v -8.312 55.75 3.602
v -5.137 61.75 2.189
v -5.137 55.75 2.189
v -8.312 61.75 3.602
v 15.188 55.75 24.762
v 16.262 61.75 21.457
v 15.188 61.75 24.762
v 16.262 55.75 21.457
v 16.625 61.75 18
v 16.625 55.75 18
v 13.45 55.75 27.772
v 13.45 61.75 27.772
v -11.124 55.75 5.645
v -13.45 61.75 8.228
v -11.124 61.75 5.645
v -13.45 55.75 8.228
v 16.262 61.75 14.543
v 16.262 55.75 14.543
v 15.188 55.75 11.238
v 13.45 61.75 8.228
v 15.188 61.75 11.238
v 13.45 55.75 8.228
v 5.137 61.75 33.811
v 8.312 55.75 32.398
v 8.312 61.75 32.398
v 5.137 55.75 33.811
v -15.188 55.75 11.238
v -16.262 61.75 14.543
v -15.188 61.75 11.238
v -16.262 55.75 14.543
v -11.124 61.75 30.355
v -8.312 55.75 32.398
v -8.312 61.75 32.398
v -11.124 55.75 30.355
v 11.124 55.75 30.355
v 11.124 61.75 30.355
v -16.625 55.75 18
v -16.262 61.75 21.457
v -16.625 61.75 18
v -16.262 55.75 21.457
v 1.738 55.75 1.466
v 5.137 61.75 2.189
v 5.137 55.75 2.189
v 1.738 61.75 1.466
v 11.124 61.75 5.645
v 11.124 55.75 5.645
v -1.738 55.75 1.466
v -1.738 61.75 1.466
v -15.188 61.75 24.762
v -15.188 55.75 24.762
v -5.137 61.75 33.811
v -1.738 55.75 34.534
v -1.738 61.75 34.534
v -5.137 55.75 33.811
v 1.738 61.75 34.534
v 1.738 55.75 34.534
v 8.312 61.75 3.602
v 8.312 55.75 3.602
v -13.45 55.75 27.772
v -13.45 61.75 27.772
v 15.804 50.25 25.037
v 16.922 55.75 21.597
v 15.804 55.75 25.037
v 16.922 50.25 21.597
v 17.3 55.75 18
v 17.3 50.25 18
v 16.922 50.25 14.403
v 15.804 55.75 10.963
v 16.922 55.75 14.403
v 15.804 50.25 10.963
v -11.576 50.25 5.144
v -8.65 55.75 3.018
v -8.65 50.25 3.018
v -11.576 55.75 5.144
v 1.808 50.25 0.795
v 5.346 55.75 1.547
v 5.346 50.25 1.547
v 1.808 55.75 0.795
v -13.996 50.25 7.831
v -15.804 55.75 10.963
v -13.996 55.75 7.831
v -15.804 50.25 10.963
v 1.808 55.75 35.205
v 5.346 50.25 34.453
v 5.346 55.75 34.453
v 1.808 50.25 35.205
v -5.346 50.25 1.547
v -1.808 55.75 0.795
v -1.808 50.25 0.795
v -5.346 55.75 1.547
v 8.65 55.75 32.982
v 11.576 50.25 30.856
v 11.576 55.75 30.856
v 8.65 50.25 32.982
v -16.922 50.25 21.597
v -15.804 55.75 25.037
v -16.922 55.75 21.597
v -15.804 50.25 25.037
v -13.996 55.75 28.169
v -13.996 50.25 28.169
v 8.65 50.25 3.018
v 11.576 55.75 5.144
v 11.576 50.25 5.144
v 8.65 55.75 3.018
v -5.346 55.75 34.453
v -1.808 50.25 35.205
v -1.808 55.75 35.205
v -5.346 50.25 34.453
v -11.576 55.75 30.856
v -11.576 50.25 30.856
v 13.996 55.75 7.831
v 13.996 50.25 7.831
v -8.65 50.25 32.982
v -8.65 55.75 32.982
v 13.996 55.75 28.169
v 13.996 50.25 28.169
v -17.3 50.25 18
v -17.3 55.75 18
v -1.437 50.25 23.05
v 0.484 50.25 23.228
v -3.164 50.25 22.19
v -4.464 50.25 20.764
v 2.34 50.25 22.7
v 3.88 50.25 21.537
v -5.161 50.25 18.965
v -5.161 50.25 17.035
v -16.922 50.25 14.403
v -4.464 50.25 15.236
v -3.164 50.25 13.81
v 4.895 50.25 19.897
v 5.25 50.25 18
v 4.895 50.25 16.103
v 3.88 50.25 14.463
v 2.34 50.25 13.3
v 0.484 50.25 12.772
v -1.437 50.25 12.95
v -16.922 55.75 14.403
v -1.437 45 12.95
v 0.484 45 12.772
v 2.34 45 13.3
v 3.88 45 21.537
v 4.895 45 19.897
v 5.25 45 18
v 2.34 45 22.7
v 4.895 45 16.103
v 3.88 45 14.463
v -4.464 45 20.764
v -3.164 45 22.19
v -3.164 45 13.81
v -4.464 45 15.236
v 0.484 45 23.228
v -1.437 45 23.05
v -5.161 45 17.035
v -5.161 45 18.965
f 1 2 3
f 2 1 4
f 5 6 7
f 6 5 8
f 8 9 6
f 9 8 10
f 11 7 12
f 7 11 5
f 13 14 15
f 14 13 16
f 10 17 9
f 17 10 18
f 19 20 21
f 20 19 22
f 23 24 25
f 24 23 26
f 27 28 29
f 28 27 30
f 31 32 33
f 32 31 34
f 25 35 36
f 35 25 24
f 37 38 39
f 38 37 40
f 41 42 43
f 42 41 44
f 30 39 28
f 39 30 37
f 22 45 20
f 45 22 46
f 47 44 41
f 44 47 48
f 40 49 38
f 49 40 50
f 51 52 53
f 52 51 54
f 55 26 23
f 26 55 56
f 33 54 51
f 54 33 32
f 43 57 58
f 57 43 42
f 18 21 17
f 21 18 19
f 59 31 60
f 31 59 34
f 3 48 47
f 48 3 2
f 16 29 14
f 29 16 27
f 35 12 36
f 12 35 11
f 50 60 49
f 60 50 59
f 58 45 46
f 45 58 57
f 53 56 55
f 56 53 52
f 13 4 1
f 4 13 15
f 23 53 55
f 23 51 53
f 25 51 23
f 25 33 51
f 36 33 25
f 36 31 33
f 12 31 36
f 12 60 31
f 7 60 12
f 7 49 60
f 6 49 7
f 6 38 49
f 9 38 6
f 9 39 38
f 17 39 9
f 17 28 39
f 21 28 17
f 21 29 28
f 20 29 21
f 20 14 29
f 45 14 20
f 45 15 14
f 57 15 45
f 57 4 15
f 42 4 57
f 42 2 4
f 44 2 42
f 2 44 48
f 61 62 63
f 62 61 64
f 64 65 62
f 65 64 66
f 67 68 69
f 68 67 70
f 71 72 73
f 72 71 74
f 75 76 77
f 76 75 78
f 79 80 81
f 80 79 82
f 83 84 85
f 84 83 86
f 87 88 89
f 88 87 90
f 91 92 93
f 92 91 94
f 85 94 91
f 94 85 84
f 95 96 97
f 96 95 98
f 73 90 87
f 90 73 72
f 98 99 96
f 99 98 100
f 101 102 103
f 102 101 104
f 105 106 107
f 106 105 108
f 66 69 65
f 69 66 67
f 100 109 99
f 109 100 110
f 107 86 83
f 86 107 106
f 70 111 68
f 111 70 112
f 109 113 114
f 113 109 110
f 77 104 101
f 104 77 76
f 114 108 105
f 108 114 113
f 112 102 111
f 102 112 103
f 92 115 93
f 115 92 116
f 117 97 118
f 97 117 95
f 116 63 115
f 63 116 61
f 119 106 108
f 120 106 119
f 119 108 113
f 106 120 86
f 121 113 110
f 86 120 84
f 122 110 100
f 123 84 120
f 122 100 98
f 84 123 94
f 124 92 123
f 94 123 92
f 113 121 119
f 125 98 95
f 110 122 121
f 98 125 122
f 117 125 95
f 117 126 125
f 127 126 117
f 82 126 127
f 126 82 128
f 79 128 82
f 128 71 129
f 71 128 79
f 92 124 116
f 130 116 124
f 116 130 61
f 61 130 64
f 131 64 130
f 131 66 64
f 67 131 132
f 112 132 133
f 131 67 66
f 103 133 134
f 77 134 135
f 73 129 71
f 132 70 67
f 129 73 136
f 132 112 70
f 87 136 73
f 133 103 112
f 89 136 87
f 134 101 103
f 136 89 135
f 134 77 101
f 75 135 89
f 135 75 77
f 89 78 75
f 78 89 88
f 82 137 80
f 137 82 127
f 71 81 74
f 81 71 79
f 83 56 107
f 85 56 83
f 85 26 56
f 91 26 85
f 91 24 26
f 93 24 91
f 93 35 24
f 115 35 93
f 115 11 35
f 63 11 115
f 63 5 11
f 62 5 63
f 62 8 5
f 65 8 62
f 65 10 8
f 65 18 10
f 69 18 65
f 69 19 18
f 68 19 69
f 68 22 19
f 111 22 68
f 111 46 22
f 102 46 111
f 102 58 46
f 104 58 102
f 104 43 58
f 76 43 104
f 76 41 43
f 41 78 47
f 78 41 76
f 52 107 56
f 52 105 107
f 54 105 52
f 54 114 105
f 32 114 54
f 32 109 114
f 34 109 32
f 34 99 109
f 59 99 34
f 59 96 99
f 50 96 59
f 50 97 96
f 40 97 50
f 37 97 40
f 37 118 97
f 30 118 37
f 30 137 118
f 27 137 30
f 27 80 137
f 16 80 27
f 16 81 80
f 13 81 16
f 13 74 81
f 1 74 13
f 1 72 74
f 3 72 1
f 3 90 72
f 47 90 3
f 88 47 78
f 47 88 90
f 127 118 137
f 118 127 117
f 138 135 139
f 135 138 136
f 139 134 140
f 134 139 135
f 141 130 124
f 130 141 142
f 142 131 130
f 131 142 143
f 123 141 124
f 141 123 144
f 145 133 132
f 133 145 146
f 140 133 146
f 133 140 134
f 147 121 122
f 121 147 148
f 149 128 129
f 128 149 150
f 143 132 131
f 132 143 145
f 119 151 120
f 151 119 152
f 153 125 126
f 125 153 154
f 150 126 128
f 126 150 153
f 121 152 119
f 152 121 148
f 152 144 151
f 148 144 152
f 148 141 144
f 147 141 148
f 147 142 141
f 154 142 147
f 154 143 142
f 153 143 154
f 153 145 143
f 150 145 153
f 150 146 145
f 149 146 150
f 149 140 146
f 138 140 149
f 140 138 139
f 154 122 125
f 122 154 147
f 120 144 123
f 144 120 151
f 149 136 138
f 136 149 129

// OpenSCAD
// gimbal motors

module main_body()
{
    inner_length = 9.5;   
    inner_diameter = 33.25;
    
    outer_diameter = 34.6;
    outer_ring_length = 5.5;
    
    center_shaft_diam = 10.5;
    center_shaft_length = 6.0;
    
    // main body
    union(){
        cylinder(inner_length, inner_diameter / 2.0, inner_diameter / 2.0,              center = true);
    // top ring
        translate([0, 0, inner_length - outer_ring_length])
        cylinder(outer_ring_length, outer_diameter   / 2.0, outer_diameter / 2.0            , center = true);

    // center shaft
        translate([0, 0, (inner_length + outer_ring_length) - center_shaft_length])
        cylinder(center_shaft_length, center_shaft_diam  / 2.0,                   center_shaft_diam / 2.0, center = true);
    
    // rounded thing shaft
        translate([0, 0, (inner_length - outer_ring_length) + 1.0])
        cylinder(1.0, 14.0 / 2.0, 14.0 / 2.0, center = true);
    }
    
    
};


// run
translate([0, 57, 18]) {
    rotate([90, 0, 0]) {
        color([0, 1, 0]) {
            main_body();
        }
    }
}
